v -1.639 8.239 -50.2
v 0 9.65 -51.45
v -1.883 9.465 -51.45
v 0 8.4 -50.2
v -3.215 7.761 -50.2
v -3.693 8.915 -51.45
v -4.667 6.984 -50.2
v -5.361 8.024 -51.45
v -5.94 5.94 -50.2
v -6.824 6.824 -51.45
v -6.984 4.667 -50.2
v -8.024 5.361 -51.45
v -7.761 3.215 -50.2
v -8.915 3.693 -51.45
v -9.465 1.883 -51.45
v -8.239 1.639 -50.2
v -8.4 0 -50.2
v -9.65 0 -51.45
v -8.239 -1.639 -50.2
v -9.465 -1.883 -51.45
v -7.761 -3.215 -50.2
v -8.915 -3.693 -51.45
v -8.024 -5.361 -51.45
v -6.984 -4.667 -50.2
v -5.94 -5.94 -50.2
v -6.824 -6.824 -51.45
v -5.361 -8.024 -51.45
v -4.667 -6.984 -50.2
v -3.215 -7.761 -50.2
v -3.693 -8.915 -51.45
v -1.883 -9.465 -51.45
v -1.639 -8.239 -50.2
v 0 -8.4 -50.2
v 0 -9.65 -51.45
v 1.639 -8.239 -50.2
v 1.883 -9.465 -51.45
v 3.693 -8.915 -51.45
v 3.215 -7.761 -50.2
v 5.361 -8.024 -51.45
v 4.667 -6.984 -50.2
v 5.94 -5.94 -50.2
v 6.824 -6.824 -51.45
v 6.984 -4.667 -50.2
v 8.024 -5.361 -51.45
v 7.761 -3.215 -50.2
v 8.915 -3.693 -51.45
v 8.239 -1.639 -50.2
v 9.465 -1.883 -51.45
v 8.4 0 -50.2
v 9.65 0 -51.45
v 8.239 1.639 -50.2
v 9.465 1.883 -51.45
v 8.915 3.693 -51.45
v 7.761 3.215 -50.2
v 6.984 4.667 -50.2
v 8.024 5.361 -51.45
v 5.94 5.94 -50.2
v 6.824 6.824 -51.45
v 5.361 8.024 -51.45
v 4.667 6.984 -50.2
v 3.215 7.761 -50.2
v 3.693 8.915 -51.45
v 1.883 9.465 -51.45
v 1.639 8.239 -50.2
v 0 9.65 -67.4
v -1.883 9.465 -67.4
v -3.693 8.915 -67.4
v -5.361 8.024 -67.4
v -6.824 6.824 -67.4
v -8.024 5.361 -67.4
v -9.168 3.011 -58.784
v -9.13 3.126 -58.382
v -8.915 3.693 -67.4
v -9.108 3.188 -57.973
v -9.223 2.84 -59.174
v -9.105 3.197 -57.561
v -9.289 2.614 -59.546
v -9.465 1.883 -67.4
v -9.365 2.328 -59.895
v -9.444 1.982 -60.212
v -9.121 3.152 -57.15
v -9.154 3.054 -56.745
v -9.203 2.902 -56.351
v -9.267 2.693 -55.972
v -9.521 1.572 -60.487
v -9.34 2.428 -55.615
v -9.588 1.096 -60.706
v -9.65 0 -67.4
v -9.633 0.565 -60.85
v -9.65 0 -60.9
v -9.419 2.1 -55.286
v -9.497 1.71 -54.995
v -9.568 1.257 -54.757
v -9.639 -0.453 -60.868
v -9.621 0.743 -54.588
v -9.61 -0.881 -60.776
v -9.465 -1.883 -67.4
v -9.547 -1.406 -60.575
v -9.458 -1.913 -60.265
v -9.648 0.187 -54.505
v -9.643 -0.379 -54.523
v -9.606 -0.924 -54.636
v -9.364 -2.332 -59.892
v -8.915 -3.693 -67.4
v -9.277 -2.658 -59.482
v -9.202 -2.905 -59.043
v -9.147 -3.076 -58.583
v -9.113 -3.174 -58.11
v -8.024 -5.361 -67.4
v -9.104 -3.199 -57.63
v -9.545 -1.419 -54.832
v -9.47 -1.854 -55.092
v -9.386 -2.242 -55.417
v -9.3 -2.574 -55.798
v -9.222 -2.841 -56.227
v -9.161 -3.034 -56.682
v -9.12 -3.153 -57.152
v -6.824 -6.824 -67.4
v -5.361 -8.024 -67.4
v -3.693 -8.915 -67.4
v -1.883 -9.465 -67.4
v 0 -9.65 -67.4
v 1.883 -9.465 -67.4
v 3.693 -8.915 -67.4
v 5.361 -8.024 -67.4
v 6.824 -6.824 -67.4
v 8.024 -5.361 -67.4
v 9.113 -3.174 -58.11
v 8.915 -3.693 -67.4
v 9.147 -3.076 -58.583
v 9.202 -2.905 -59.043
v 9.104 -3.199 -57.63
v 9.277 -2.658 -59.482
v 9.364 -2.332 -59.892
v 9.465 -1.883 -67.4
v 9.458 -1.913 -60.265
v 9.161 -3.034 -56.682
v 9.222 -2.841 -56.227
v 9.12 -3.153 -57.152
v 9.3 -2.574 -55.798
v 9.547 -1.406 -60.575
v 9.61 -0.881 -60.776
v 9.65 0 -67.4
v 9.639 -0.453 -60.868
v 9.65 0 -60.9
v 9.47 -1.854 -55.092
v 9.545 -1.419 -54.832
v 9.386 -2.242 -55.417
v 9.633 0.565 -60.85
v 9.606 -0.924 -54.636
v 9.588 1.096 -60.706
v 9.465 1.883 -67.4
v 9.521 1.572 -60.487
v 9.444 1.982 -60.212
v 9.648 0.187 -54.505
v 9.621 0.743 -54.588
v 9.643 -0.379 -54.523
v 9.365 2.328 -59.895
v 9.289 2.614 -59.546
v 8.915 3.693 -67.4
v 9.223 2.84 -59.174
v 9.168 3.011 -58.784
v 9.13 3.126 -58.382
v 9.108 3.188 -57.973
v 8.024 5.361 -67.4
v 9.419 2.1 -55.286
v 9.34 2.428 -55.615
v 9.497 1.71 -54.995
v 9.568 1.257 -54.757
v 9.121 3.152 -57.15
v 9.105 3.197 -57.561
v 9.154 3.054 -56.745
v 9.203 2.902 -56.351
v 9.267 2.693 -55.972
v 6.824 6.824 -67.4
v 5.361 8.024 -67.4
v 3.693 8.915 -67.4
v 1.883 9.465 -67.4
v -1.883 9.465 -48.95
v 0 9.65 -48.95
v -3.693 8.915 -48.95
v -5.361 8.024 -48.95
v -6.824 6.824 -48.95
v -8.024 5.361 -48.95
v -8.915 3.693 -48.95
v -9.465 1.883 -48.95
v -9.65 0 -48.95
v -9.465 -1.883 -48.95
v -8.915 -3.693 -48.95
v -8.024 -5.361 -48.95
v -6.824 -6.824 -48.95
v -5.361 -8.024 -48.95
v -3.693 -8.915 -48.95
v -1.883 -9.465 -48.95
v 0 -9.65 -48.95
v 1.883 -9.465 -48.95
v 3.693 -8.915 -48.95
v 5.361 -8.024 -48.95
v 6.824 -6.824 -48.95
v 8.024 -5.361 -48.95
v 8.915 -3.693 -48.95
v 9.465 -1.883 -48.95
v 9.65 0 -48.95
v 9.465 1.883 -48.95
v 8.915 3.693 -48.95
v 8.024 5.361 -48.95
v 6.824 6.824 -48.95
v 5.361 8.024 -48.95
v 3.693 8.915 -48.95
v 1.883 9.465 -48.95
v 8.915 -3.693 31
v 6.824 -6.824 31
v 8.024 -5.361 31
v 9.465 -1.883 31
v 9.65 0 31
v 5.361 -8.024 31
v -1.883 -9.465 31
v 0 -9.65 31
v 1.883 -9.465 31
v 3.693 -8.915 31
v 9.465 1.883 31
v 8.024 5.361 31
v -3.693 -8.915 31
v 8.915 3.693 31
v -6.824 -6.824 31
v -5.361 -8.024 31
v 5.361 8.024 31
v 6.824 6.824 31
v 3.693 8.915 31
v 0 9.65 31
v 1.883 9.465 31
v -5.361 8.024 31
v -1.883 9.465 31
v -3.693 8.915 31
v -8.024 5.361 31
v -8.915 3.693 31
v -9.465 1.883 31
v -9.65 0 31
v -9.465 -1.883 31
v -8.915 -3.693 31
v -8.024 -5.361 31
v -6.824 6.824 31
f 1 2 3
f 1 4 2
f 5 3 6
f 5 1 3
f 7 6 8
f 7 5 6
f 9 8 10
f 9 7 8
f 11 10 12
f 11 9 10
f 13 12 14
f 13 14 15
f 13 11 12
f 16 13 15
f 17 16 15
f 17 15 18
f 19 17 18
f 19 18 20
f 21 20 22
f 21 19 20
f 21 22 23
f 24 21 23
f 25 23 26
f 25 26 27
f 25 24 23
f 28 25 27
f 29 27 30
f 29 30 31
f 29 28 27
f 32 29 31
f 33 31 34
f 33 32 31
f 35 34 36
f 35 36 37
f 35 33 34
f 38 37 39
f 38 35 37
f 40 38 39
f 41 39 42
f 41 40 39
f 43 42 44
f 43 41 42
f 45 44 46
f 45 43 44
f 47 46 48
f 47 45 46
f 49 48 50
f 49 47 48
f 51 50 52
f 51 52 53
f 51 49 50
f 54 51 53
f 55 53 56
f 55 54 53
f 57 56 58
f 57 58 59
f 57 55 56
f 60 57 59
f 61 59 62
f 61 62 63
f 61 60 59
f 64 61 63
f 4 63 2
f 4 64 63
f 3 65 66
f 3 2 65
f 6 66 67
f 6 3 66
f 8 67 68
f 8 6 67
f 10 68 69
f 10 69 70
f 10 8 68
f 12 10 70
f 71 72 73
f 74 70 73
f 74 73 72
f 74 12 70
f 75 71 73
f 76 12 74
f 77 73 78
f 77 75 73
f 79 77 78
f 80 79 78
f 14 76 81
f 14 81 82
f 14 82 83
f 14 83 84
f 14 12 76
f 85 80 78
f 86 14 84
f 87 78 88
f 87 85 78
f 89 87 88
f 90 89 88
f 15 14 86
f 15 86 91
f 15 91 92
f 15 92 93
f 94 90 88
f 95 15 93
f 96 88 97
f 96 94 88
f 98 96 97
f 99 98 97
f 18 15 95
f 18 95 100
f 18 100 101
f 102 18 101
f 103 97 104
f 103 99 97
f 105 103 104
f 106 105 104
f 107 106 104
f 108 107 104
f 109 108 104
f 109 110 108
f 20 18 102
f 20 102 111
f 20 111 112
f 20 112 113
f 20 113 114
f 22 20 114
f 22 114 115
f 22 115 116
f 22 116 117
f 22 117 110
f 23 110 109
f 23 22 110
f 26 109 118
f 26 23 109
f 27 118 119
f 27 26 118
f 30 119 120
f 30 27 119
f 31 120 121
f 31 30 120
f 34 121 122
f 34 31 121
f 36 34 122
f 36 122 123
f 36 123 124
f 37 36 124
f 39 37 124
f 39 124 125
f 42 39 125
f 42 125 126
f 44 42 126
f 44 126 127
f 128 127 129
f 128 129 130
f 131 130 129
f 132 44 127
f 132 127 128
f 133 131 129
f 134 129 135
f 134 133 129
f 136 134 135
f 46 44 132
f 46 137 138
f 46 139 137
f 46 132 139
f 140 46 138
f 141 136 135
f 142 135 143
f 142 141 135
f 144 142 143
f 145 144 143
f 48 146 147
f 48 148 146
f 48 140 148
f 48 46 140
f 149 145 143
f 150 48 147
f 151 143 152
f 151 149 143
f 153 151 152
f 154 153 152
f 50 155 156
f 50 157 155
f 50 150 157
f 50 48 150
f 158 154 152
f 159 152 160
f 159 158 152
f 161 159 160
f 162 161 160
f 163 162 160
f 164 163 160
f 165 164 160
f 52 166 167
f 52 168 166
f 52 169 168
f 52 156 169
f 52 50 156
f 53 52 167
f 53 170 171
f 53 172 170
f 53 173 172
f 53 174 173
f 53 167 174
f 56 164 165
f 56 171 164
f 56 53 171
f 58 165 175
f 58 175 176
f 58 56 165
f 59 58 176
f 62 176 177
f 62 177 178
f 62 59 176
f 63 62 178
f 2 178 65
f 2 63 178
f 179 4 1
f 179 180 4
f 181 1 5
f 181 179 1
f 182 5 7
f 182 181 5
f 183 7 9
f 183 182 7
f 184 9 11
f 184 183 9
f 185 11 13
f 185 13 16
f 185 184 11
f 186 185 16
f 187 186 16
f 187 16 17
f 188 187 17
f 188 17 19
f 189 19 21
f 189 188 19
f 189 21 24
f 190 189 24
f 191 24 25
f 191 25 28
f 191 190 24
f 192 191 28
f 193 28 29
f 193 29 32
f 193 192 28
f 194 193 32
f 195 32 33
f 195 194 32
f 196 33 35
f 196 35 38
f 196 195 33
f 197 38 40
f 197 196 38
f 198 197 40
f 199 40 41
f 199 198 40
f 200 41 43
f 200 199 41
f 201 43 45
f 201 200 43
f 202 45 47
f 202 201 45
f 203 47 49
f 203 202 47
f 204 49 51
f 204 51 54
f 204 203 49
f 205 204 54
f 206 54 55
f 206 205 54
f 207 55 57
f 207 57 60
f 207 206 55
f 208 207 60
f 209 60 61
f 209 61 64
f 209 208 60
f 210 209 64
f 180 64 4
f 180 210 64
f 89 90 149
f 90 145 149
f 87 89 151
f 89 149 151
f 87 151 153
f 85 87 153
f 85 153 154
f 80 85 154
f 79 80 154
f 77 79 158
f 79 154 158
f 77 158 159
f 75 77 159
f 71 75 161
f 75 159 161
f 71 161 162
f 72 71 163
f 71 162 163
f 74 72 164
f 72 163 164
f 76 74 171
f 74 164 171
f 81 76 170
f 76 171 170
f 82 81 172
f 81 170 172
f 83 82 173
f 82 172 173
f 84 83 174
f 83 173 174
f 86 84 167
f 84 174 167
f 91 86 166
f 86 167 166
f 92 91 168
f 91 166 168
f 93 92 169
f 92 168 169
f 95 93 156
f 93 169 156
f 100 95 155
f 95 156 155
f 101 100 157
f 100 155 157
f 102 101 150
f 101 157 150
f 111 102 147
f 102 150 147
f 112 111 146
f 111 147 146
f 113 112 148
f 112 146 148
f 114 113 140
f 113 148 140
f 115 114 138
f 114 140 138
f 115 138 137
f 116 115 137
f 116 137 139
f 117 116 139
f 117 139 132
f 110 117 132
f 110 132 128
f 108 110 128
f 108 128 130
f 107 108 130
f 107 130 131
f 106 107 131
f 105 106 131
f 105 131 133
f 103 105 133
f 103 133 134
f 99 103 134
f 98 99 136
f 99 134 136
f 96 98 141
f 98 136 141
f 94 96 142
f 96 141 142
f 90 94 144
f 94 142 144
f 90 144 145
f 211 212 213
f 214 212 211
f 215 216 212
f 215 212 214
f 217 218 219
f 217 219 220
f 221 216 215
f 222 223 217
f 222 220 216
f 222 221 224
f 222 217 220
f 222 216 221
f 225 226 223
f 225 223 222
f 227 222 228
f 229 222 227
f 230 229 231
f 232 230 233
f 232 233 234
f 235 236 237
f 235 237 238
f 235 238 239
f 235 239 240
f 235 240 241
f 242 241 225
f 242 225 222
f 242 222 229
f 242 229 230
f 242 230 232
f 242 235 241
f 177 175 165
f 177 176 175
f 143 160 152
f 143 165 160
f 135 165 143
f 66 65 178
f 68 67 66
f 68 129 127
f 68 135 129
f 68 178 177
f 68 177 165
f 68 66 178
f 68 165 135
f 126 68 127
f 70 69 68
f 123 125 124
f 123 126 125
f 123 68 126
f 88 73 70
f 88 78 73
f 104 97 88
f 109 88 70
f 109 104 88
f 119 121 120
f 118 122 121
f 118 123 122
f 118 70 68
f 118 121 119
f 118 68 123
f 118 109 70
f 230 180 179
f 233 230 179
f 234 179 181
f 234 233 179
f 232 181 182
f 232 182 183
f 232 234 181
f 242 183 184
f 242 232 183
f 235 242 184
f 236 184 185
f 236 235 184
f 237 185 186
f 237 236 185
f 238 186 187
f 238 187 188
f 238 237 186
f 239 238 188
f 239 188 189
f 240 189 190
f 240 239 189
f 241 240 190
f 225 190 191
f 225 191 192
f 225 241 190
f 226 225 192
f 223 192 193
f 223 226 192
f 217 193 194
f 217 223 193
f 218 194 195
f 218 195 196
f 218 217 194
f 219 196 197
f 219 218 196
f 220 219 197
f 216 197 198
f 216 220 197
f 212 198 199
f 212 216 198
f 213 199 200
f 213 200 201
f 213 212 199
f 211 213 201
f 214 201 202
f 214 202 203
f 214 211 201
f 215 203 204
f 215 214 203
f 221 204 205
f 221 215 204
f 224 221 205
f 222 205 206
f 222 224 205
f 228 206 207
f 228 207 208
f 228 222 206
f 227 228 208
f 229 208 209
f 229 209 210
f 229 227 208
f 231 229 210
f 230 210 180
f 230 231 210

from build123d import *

# Parameters (mm, degrees)
SKETCH2_R                 = 3.2
FRONT_MOUNTING_DEPTH      = 10.65
FRONT_MOUNTING_DEPTH_BACK = 10.65


with BuildPart() as part:
    # Sketch1 → Body (revolve)
    with BuildSketch(Plane(origin=(0, 0, 0), x_dir=(0, 0, -1), z_dir=(1, 0, 0))):
        Polygon((51.45, 9.65), (50.2, 8.4), (48.95, 9.65), (-31, 9.65), (-31, 0), (67.4, 0), (67.4, 9.65), (57.7, 9.65), align=None)
    revolve(axis=Axis((0, 0, -67.4), (0, 0, 1)))

    # Sketch2 → Front-Mounting (cut, two sides)
    with BuildSketch(Plane(origin=(0, 0, 0), x_dir=(0, 0, -1), z_dir=(1, 0, 0))) as front_mounting_sk:
        with Locations((57.7, 0)):
            Circle(SKETCH2_R)
    extrude(amount=FRONT_MOUNTING_DEPTH, mode=Mode.SUBTRACT)
    extrude(front_mounting_sk.sketch, amount=-FRONT_MOUNTING_DEPTH_BACK, mode=Mode.SUBTRACT)


solid = part.part
